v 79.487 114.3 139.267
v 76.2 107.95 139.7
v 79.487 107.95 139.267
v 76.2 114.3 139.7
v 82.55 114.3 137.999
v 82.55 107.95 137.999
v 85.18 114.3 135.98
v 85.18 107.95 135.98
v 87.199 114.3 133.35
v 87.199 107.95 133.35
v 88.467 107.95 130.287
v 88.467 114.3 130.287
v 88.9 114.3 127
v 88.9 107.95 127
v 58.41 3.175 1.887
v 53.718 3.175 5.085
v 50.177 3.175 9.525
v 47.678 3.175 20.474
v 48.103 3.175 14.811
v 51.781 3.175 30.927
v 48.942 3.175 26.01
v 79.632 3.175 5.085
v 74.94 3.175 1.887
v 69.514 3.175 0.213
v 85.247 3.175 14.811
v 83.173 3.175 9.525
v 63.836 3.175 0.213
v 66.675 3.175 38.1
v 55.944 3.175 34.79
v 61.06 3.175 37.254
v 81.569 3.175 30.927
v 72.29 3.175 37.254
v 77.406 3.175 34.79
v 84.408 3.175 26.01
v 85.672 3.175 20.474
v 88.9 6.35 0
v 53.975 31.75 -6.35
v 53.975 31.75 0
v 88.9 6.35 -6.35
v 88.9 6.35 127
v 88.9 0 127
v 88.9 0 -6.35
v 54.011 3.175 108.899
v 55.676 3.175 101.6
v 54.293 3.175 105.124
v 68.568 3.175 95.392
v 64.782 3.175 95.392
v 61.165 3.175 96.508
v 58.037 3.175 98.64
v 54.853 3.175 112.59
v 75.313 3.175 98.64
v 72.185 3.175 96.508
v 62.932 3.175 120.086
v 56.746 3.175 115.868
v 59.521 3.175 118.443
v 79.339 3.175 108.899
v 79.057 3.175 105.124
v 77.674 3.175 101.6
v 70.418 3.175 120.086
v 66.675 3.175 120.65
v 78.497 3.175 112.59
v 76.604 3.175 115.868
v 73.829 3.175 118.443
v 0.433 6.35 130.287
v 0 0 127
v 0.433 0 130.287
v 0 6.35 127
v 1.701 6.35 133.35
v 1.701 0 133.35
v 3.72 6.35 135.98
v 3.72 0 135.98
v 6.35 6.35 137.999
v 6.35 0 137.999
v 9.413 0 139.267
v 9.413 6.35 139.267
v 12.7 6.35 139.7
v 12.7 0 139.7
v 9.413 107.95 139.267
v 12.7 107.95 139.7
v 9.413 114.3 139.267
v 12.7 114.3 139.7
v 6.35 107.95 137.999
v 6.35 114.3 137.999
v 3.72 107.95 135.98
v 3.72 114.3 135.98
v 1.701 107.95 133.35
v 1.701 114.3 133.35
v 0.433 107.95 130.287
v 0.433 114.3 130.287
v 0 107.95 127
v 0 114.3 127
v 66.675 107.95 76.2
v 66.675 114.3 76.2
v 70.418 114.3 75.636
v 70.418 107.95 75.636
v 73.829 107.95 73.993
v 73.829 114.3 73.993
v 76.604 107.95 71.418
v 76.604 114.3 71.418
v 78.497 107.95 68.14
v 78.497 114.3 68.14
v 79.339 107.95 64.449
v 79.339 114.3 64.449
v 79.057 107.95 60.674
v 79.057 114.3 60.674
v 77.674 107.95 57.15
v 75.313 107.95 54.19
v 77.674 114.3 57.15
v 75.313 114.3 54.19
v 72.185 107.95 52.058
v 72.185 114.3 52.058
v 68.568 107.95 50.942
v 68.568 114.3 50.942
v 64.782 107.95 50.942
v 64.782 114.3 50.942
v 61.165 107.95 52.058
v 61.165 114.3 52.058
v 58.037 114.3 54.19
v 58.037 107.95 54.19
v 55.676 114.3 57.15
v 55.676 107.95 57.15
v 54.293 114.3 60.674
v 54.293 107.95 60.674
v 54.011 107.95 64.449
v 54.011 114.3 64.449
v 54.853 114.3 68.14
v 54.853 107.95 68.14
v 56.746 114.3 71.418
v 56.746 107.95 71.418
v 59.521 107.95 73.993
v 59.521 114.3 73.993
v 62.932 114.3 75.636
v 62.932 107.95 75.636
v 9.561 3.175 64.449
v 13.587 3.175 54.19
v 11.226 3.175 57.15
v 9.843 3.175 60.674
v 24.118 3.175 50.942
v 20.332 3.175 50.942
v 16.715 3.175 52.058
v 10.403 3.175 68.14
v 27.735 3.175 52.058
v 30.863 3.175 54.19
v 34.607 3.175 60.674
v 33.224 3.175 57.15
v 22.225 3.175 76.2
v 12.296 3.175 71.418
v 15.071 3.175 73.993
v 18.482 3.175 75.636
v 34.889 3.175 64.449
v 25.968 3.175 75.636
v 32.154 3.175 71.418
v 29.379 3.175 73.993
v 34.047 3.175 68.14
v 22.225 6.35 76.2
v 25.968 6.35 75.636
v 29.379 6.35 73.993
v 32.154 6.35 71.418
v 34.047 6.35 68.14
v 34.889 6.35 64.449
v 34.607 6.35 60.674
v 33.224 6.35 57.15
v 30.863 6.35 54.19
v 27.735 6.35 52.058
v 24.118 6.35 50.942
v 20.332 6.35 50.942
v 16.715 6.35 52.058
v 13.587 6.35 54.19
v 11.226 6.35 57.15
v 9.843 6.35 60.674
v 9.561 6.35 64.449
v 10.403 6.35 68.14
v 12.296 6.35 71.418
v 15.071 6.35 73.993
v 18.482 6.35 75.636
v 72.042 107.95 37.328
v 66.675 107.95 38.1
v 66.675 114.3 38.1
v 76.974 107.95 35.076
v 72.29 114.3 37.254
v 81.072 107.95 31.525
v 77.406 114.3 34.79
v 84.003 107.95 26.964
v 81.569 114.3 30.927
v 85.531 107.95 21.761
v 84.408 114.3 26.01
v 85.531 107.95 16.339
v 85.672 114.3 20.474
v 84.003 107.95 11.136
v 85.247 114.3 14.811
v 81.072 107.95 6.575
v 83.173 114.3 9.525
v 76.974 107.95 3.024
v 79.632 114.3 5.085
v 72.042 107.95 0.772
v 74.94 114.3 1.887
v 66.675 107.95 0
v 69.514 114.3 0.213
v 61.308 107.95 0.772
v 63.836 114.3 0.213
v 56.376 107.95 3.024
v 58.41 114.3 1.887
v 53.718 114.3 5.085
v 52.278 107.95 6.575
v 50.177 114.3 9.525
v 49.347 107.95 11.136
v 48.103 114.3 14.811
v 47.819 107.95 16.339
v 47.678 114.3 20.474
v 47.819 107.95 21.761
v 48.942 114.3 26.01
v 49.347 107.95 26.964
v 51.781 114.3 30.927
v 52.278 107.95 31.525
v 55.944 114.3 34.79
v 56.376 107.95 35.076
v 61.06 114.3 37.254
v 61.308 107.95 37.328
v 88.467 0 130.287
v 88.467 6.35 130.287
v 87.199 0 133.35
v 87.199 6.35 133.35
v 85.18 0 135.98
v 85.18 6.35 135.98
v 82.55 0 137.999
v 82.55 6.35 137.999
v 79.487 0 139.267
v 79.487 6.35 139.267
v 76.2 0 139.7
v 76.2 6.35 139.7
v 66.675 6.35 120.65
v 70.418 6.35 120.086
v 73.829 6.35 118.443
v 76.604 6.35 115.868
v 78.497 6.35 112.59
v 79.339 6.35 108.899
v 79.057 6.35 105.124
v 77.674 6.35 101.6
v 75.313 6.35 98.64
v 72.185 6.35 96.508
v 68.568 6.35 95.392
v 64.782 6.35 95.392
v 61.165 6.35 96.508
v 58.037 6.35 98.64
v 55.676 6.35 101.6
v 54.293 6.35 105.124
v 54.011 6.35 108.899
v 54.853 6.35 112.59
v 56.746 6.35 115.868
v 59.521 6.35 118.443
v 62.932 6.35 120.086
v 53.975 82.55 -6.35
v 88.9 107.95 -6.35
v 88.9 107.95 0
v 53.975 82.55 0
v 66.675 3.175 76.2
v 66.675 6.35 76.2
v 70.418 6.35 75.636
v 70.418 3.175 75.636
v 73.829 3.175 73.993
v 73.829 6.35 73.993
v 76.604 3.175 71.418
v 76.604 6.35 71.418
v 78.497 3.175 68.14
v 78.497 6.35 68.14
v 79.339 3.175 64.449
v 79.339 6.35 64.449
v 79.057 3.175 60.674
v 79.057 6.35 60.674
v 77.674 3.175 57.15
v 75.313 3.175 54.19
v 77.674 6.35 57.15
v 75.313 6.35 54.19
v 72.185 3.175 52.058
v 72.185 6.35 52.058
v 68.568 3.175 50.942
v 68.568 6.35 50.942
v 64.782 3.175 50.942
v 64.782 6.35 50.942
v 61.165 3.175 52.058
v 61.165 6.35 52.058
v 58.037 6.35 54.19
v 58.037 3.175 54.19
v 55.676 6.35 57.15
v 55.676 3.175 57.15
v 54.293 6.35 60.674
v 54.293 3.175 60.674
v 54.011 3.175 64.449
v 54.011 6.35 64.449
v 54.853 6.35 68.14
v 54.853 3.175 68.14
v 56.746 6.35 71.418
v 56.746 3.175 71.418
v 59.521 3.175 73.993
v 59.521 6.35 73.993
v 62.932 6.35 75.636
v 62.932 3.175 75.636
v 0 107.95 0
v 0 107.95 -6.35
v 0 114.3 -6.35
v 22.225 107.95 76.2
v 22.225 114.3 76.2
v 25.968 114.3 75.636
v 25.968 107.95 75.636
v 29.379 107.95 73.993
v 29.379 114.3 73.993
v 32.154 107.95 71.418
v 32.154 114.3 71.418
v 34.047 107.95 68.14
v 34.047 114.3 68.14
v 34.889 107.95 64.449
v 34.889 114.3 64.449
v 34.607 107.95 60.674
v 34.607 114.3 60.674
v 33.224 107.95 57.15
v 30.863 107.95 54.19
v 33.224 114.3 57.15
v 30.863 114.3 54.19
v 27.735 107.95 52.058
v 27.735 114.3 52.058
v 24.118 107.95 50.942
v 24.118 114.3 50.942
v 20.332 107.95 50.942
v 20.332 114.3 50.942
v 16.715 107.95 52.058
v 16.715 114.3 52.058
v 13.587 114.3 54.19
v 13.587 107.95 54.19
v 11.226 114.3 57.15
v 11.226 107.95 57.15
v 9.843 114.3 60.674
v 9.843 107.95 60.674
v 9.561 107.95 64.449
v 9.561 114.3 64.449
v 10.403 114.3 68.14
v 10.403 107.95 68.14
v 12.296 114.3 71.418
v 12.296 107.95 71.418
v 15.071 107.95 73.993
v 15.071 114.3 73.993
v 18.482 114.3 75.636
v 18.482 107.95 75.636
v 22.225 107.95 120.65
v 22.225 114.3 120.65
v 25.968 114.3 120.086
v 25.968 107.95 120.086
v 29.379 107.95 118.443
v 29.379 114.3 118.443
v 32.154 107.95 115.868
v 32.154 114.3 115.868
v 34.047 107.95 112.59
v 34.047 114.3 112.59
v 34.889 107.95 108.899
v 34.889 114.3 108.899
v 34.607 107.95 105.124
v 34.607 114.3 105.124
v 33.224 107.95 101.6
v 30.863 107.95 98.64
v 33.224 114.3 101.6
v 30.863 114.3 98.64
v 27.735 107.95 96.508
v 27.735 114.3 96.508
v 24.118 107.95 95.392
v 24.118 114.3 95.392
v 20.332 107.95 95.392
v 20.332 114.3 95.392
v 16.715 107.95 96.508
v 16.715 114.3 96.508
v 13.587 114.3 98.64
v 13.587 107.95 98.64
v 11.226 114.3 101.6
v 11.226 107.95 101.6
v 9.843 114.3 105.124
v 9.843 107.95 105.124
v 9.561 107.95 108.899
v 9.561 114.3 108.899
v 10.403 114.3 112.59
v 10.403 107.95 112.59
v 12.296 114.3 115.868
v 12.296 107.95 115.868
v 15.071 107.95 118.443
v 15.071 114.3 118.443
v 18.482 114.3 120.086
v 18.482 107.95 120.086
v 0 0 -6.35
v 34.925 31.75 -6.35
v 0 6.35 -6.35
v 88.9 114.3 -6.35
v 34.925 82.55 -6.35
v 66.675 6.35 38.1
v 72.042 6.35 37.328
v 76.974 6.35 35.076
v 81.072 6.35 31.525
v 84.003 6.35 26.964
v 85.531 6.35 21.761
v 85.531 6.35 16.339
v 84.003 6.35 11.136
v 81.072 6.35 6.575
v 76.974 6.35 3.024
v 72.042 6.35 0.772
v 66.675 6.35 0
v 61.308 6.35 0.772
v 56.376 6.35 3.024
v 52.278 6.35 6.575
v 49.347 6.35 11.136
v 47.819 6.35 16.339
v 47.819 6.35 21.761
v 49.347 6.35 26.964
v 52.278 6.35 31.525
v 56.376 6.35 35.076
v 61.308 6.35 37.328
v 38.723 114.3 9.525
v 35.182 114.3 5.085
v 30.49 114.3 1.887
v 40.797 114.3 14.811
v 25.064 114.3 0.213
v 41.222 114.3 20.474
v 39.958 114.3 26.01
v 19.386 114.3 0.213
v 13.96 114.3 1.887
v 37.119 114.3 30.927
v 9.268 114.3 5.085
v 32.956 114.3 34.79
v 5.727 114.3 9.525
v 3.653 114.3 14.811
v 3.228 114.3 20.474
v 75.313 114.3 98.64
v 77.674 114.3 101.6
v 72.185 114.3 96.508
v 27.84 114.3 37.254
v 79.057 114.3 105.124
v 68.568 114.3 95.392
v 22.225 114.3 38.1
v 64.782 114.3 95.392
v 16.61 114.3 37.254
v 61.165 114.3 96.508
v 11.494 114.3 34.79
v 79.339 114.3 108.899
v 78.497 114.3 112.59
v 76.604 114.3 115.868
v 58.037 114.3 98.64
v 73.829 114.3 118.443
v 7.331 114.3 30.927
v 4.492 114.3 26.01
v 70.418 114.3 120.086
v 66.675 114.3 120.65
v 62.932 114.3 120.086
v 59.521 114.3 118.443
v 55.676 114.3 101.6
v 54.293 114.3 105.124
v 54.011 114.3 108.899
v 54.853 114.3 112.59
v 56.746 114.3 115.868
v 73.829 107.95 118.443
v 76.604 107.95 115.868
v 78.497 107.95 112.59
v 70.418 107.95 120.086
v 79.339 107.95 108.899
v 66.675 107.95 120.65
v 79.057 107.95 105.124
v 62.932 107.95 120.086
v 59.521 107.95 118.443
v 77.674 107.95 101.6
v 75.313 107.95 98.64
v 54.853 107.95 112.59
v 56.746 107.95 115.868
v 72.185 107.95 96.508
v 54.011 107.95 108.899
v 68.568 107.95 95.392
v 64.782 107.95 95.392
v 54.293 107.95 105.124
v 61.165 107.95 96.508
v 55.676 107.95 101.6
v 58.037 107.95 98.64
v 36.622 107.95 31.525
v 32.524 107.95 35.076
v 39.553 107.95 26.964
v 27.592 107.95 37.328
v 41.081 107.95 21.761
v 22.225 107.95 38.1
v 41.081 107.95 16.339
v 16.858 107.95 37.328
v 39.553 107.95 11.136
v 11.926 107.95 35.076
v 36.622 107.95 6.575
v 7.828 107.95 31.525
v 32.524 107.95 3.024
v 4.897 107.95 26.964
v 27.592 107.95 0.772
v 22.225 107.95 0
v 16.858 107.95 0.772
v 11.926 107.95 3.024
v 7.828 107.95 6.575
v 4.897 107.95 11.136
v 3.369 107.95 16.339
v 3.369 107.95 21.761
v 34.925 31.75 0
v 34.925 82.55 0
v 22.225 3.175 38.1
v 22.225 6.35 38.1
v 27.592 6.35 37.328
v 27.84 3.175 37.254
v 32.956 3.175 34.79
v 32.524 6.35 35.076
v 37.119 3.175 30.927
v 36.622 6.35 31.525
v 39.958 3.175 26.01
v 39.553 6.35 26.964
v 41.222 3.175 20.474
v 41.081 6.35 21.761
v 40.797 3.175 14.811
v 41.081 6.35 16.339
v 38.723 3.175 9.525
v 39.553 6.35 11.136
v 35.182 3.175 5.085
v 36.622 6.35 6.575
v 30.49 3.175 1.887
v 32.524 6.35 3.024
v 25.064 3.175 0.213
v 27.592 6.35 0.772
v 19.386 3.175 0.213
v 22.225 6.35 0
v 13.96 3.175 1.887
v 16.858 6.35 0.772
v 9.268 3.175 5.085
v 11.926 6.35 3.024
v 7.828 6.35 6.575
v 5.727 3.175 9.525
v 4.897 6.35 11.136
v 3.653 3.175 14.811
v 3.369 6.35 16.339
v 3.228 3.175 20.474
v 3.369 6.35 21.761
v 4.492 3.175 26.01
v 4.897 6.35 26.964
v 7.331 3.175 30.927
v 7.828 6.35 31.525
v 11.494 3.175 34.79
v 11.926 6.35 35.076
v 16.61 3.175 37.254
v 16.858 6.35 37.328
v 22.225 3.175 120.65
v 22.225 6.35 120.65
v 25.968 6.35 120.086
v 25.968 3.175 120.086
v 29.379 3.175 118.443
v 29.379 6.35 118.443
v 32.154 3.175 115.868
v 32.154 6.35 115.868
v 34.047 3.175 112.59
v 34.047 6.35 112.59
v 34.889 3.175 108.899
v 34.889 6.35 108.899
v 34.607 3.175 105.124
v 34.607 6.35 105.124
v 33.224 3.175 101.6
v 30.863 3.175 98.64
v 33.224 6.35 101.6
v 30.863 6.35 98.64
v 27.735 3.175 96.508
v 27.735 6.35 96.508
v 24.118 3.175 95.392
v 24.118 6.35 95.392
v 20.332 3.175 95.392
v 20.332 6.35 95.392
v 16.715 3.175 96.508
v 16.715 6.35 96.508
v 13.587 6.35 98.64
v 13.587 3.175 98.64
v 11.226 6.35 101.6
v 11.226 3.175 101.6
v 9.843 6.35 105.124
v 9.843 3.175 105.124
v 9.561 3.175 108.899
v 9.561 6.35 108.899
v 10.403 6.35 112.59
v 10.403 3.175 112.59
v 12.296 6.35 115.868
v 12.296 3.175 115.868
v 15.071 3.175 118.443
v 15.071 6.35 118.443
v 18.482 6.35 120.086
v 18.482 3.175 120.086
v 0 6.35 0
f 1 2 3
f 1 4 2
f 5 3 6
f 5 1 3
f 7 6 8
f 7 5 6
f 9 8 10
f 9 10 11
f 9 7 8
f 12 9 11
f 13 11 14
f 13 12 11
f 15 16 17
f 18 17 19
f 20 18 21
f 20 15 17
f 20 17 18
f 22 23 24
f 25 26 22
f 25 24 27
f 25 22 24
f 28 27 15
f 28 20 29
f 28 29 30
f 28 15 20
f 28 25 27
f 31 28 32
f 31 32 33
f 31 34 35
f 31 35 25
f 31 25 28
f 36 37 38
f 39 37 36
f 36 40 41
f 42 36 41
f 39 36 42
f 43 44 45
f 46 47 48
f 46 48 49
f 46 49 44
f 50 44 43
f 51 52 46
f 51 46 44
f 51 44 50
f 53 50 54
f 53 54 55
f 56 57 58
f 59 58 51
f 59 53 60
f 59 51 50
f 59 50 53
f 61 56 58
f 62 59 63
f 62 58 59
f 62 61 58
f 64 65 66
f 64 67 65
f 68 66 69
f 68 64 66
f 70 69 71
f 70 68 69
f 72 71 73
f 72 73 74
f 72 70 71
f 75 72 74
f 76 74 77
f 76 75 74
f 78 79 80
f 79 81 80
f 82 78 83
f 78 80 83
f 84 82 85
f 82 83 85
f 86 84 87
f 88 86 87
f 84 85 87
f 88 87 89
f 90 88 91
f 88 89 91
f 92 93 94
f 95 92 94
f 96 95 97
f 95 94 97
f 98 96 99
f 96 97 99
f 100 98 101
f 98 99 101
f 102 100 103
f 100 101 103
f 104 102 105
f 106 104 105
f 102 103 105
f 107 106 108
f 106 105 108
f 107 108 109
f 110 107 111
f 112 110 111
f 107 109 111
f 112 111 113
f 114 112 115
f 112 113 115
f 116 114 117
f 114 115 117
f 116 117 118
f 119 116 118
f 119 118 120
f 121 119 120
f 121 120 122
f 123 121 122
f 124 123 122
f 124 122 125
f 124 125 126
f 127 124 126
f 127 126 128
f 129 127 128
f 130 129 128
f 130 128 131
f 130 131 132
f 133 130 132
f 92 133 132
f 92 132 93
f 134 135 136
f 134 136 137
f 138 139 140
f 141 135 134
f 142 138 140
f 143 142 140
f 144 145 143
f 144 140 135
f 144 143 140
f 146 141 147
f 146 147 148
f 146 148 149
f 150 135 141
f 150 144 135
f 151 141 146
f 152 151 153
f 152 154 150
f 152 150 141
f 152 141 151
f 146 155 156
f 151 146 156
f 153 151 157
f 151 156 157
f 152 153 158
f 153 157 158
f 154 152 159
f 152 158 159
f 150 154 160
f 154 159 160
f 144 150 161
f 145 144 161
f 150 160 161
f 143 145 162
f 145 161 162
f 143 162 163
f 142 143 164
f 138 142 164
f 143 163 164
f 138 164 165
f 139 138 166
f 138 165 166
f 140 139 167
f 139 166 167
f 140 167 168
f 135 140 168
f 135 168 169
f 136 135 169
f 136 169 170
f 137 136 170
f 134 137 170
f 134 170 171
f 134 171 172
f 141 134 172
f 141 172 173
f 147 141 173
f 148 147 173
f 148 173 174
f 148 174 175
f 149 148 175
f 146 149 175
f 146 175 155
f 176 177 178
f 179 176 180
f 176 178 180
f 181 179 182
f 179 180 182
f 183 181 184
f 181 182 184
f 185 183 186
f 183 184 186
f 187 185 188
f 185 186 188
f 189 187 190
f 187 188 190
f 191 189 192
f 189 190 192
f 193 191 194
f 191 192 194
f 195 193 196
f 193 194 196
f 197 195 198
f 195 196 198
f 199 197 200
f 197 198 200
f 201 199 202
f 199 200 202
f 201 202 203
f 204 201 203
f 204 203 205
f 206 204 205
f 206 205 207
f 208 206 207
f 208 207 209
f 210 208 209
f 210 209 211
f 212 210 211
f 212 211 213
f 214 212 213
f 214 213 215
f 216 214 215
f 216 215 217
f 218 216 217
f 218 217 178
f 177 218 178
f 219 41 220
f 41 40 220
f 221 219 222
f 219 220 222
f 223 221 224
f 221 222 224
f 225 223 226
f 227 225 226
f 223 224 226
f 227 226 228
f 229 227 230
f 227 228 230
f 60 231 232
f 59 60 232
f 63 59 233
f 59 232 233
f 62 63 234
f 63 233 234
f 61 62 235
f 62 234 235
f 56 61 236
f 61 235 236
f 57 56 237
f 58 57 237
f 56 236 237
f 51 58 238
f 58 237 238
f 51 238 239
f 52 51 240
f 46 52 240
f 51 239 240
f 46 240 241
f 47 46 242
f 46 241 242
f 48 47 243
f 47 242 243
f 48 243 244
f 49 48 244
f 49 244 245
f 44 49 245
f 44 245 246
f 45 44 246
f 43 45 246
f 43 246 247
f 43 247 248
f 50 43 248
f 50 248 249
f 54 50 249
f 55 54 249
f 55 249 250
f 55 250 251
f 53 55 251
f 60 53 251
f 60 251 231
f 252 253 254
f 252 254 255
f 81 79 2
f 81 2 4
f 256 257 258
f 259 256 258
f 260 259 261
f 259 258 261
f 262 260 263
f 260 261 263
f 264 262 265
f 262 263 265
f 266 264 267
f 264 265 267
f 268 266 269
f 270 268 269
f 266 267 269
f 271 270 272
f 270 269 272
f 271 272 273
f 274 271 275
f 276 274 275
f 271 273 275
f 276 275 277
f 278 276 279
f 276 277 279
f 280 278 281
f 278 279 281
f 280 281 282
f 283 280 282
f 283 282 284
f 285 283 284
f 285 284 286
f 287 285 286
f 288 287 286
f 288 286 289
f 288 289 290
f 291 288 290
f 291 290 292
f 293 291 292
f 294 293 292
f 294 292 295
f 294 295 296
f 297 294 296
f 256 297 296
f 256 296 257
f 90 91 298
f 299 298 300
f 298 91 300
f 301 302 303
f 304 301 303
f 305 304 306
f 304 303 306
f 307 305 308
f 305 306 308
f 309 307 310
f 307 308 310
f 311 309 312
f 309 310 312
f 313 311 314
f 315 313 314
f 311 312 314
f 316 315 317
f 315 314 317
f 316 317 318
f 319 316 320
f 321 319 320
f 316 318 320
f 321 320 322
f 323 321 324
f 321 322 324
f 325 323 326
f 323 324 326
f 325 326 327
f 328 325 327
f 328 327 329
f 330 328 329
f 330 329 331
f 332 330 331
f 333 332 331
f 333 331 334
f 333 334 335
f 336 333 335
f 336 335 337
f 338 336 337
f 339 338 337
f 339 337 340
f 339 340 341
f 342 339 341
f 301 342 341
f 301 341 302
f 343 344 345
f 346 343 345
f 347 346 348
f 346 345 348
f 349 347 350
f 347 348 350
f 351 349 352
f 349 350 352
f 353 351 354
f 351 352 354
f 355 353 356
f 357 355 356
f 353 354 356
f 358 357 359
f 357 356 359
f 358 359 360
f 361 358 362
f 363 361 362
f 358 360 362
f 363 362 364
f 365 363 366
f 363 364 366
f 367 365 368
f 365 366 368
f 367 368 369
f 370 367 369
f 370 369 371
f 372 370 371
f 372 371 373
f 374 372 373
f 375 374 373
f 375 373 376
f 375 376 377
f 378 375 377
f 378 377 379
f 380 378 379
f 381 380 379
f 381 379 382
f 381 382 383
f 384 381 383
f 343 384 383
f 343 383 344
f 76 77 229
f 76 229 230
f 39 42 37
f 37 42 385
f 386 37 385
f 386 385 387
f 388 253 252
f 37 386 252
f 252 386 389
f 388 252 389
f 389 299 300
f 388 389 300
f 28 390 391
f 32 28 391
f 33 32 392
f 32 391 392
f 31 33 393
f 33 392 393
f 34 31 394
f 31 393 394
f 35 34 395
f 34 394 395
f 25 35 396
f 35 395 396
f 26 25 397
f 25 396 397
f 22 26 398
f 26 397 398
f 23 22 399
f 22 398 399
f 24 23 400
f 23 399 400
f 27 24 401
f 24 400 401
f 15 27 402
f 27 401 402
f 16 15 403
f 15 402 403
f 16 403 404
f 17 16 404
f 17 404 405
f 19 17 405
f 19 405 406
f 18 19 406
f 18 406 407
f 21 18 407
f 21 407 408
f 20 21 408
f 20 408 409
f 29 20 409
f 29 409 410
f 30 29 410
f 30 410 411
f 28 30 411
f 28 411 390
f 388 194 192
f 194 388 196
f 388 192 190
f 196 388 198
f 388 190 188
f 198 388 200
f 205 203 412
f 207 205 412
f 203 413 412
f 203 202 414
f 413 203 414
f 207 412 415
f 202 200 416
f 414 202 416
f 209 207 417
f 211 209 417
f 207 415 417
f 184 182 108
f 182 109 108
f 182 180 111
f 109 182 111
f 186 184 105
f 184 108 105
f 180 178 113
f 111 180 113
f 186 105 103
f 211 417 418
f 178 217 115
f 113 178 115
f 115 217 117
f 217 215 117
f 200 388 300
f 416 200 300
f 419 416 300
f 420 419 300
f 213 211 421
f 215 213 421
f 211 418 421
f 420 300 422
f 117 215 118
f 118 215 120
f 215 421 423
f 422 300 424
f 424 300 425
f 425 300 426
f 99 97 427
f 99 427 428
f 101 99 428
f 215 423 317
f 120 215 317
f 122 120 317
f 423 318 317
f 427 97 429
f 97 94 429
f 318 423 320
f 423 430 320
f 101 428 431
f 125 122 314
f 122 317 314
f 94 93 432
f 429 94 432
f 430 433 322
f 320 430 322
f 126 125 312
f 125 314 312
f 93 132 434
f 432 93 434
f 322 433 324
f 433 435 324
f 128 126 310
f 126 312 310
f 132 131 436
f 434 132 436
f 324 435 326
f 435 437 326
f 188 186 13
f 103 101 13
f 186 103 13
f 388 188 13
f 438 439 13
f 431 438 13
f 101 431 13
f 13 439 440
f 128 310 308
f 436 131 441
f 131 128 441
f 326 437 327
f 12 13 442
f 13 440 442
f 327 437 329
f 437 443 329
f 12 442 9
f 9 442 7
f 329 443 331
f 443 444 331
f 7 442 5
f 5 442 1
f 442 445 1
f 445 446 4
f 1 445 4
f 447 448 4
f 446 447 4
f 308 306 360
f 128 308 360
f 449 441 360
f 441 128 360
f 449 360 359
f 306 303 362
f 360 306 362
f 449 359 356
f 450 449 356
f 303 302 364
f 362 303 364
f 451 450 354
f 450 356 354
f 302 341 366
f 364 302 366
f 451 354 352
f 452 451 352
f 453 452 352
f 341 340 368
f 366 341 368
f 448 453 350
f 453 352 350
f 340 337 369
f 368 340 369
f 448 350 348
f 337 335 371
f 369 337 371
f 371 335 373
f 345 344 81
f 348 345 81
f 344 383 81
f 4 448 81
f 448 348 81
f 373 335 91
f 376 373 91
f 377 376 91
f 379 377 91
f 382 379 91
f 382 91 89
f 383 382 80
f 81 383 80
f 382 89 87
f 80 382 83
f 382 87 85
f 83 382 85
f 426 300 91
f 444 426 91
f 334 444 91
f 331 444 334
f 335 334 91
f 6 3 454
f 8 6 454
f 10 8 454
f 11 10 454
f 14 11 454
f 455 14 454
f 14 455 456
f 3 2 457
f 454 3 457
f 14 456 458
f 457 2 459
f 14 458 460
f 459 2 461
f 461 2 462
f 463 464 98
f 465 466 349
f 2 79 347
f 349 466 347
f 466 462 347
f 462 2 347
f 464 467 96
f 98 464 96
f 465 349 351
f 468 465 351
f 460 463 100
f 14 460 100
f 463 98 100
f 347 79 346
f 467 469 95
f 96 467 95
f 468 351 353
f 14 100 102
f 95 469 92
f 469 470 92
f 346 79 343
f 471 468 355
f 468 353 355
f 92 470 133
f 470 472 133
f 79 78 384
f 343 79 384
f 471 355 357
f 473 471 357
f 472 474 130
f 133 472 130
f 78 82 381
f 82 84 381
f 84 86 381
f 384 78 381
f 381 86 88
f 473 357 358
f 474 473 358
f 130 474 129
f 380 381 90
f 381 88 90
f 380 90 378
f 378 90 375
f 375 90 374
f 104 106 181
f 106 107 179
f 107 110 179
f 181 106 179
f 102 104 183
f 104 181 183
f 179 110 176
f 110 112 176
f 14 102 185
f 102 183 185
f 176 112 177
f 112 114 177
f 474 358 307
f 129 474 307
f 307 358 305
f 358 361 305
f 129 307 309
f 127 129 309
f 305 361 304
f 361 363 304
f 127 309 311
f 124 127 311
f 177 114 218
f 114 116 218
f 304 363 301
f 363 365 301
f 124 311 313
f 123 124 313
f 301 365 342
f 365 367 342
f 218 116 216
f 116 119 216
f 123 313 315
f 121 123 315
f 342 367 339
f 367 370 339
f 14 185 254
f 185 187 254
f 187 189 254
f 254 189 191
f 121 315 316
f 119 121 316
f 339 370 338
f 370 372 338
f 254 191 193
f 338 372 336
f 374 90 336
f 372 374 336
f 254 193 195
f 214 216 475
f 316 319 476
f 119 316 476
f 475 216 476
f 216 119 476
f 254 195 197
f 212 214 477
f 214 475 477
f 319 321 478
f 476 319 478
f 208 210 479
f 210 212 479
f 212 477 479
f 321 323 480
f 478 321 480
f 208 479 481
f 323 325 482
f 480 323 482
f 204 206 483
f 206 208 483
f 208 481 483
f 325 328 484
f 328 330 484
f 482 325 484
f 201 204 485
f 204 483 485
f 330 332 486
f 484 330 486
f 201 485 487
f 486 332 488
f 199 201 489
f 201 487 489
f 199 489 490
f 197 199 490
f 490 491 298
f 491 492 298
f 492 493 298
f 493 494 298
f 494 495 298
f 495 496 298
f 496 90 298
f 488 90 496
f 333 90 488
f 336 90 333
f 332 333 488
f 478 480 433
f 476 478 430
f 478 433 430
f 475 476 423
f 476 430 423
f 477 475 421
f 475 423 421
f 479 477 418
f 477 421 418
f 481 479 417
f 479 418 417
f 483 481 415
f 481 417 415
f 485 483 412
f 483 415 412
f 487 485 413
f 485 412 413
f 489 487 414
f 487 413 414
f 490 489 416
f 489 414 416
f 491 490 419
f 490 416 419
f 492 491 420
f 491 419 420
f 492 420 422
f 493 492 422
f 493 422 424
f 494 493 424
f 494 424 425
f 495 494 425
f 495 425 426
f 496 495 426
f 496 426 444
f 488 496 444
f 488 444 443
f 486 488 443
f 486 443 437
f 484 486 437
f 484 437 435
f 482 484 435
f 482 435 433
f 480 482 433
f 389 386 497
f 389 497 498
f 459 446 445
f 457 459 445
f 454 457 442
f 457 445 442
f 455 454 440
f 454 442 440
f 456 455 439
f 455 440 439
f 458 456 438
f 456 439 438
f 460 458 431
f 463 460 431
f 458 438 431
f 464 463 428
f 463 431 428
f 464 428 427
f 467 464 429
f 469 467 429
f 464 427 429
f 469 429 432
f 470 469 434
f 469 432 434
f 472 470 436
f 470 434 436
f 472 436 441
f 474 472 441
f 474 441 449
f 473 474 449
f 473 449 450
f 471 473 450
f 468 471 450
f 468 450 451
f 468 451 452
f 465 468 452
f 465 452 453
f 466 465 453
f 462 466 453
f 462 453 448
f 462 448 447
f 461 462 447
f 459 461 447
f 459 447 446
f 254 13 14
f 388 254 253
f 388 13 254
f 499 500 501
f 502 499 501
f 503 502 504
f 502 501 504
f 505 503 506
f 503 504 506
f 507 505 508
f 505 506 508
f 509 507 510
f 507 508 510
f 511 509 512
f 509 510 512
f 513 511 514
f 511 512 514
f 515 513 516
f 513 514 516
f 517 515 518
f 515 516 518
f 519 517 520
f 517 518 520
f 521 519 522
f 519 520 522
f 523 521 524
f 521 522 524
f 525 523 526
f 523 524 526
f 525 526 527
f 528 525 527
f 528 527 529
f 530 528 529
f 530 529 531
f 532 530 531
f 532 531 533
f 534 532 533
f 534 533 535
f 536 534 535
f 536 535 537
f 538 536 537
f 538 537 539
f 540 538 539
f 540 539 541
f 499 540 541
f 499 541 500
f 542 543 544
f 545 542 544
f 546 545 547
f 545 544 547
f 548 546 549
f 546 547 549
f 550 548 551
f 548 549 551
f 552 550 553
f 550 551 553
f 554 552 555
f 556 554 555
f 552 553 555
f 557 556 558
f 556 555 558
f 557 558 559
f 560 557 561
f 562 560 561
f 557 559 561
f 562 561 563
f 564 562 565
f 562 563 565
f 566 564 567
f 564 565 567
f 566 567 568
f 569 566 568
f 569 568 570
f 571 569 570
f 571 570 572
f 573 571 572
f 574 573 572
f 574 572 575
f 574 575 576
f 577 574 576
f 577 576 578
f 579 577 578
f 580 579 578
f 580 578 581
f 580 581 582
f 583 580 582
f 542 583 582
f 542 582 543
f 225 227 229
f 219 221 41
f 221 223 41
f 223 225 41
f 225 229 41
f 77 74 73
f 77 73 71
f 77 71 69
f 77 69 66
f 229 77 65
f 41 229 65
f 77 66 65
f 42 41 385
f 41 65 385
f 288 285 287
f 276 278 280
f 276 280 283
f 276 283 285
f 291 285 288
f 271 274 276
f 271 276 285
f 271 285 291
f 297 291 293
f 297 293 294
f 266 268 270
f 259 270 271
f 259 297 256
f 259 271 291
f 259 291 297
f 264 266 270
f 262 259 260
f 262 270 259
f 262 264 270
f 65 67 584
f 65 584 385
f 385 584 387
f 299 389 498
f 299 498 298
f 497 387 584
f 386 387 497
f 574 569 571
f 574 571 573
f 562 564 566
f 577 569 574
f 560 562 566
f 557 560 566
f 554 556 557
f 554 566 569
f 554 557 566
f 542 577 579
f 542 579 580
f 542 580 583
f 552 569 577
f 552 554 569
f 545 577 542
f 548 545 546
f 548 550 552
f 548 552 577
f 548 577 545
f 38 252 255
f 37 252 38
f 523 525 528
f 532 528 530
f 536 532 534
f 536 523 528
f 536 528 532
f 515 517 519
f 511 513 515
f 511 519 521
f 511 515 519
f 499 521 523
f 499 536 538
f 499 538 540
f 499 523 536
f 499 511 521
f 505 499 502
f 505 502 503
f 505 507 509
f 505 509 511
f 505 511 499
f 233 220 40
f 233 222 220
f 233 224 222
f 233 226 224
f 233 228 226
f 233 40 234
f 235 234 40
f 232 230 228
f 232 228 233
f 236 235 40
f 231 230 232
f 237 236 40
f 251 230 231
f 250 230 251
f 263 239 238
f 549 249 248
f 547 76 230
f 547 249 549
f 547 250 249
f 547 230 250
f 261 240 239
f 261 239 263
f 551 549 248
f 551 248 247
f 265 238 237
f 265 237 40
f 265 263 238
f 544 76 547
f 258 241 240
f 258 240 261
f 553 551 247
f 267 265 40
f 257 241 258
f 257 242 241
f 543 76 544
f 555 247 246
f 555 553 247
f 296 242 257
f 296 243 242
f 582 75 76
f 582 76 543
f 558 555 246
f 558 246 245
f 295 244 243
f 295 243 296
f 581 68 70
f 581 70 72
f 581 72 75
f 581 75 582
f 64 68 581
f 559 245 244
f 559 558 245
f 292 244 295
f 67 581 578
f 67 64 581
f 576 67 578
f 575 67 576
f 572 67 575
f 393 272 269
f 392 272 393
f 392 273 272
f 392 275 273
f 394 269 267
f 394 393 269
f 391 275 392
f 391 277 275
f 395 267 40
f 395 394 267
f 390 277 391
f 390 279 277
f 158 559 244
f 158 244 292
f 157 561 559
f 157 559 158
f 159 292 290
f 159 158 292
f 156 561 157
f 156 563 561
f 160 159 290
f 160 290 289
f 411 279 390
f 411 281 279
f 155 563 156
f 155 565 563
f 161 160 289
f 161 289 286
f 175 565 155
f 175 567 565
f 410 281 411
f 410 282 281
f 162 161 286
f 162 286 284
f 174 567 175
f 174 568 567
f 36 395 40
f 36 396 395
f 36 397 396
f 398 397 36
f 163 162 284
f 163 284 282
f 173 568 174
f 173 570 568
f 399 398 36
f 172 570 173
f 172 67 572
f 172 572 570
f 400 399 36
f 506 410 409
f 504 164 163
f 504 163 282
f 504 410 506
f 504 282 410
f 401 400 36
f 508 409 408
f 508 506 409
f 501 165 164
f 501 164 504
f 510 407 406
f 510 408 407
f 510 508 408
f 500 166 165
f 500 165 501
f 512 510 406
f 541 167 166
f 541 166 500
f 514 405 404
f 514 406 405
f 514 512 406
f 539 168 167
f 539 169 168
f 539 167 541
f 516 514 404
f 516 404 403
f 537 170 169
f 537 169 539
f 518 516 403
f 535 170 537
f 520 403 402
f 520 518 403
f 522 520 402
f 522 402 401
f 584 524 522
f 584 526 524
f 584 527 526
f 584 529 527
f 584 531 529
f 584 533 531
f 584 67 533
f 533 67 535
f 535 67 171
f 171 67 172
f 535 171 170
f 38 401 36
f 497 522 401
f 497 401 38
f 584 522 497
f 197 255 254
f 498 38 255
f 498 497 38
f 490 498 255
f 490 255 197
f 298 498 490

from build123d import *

# Parameters (mm, degrees)
SKETCH1_W               = 139.7
SKETCH1_H               = 6.35
SKETCH1_W_2             = 6.35
SKETCH1_H_2             = 114.3
BOSS_EXTRUDE1_DEPTH     = 88.9
SKETCH2_R               = 19.05
SKETCH2_R_2             = 12.7
CUT_EXTRUDE1_DEPTH      = 111.125
CUT_EXTRUDE3_DEPTH      = 202.205839875
CUT_EXTRUDE3_DEPTH_BACK = 202.205839875
FILLET1_R               = 12.7


with BuildPart() as part:
    # Sketch1 → Boss-Extrude1 (new body)
    with BuildSketch(Plane(origin=(0, 0, 0), x_dir=(0, 0, -1), z_dir=(1, 0, 0))):
        with Locations((-69.85, 111.125)):
            Rectangle(SKETCH1_W, SKETCH1_H)
        with Locations((3.175, 57.15)):
            Rectangle(SKETCH1_W_2, SKETCH1_H_2)
        with Locations((-69.85, 3.175)):
            Rectangle(SKETCH1_W, SKETCH1_H)
    extrude(amount=BOSS_EXTRUDE1_DEPTH)

    # Sketch2 → Cut-Extrude1 (cut)
    with BuildSketch(Plane(origin=(0, 114.3, 0), x_dir=(1, 0, 0), z_dir=(0, 1, 0))):
        with Locations(Location((66.675, -19.05, 0), (0, 0, 270))):
            Circle(SKETCH2_R)
        with Locations(Location((66.675, -63.5, 0), (0, 0, 270))):
            Circle(SKETCH2_R_2)
        with Locations(Location((66.675, -107.95, 0), (0, 0, 270))):
            Circle(SKETCH2_R_2)
        with Locations(Location((22.225, -107.95, 0), (0, 0, 270))):
            Circle(SKETCH2_R_2)
        with Locations(Location((22.225, -63.5, 0), (0, 0, 270))):
            Circle(SKETCH2_R_2)
        with Locations(Location((22.225, -19.05, 0), (0, 0, 270))):
            Circle(SKETCH2_R)
    extrude(amount=-CUT_EXTRUDE1_DEPTH, mode=Mode.SUBTRACT)

    # Sketch4 → Cut-Extrude3 (cut, two sides: drawn at the far end of the back side and taken through both)
    with BuildSketch(Plane.XY.offset(-CUT_EXTRUDE3_DEPTH_BACK)):
        Polygon((34.925, 31.75), (34.925, 82.55), (0, 107.95), (0, 6.35), align=None)
        Polygon((53.975, 82.55), (53.975, 31.75), (88.9, 6.35), (88.9, 107.95), align=None)
    extrude(amount=CUT_EXTRUDE3_DEPTH + CUT_EXTRUDE3_DEPTH_BACK, mode=Mode.SUBTRACT)

    # Fillet1
    fillet1_edges = [part.edges().sort_by_distance(p)[0] for p in [
        (88.9, 111.125, 139.7),
        (0, 3.175, 139.7),
        (0, 111.125, 139.7),
        (88.9, 3.175, 139.7),
    ]]
    fillet(fillet1_edges, radius=FILLET1_R)


solid = part.part
